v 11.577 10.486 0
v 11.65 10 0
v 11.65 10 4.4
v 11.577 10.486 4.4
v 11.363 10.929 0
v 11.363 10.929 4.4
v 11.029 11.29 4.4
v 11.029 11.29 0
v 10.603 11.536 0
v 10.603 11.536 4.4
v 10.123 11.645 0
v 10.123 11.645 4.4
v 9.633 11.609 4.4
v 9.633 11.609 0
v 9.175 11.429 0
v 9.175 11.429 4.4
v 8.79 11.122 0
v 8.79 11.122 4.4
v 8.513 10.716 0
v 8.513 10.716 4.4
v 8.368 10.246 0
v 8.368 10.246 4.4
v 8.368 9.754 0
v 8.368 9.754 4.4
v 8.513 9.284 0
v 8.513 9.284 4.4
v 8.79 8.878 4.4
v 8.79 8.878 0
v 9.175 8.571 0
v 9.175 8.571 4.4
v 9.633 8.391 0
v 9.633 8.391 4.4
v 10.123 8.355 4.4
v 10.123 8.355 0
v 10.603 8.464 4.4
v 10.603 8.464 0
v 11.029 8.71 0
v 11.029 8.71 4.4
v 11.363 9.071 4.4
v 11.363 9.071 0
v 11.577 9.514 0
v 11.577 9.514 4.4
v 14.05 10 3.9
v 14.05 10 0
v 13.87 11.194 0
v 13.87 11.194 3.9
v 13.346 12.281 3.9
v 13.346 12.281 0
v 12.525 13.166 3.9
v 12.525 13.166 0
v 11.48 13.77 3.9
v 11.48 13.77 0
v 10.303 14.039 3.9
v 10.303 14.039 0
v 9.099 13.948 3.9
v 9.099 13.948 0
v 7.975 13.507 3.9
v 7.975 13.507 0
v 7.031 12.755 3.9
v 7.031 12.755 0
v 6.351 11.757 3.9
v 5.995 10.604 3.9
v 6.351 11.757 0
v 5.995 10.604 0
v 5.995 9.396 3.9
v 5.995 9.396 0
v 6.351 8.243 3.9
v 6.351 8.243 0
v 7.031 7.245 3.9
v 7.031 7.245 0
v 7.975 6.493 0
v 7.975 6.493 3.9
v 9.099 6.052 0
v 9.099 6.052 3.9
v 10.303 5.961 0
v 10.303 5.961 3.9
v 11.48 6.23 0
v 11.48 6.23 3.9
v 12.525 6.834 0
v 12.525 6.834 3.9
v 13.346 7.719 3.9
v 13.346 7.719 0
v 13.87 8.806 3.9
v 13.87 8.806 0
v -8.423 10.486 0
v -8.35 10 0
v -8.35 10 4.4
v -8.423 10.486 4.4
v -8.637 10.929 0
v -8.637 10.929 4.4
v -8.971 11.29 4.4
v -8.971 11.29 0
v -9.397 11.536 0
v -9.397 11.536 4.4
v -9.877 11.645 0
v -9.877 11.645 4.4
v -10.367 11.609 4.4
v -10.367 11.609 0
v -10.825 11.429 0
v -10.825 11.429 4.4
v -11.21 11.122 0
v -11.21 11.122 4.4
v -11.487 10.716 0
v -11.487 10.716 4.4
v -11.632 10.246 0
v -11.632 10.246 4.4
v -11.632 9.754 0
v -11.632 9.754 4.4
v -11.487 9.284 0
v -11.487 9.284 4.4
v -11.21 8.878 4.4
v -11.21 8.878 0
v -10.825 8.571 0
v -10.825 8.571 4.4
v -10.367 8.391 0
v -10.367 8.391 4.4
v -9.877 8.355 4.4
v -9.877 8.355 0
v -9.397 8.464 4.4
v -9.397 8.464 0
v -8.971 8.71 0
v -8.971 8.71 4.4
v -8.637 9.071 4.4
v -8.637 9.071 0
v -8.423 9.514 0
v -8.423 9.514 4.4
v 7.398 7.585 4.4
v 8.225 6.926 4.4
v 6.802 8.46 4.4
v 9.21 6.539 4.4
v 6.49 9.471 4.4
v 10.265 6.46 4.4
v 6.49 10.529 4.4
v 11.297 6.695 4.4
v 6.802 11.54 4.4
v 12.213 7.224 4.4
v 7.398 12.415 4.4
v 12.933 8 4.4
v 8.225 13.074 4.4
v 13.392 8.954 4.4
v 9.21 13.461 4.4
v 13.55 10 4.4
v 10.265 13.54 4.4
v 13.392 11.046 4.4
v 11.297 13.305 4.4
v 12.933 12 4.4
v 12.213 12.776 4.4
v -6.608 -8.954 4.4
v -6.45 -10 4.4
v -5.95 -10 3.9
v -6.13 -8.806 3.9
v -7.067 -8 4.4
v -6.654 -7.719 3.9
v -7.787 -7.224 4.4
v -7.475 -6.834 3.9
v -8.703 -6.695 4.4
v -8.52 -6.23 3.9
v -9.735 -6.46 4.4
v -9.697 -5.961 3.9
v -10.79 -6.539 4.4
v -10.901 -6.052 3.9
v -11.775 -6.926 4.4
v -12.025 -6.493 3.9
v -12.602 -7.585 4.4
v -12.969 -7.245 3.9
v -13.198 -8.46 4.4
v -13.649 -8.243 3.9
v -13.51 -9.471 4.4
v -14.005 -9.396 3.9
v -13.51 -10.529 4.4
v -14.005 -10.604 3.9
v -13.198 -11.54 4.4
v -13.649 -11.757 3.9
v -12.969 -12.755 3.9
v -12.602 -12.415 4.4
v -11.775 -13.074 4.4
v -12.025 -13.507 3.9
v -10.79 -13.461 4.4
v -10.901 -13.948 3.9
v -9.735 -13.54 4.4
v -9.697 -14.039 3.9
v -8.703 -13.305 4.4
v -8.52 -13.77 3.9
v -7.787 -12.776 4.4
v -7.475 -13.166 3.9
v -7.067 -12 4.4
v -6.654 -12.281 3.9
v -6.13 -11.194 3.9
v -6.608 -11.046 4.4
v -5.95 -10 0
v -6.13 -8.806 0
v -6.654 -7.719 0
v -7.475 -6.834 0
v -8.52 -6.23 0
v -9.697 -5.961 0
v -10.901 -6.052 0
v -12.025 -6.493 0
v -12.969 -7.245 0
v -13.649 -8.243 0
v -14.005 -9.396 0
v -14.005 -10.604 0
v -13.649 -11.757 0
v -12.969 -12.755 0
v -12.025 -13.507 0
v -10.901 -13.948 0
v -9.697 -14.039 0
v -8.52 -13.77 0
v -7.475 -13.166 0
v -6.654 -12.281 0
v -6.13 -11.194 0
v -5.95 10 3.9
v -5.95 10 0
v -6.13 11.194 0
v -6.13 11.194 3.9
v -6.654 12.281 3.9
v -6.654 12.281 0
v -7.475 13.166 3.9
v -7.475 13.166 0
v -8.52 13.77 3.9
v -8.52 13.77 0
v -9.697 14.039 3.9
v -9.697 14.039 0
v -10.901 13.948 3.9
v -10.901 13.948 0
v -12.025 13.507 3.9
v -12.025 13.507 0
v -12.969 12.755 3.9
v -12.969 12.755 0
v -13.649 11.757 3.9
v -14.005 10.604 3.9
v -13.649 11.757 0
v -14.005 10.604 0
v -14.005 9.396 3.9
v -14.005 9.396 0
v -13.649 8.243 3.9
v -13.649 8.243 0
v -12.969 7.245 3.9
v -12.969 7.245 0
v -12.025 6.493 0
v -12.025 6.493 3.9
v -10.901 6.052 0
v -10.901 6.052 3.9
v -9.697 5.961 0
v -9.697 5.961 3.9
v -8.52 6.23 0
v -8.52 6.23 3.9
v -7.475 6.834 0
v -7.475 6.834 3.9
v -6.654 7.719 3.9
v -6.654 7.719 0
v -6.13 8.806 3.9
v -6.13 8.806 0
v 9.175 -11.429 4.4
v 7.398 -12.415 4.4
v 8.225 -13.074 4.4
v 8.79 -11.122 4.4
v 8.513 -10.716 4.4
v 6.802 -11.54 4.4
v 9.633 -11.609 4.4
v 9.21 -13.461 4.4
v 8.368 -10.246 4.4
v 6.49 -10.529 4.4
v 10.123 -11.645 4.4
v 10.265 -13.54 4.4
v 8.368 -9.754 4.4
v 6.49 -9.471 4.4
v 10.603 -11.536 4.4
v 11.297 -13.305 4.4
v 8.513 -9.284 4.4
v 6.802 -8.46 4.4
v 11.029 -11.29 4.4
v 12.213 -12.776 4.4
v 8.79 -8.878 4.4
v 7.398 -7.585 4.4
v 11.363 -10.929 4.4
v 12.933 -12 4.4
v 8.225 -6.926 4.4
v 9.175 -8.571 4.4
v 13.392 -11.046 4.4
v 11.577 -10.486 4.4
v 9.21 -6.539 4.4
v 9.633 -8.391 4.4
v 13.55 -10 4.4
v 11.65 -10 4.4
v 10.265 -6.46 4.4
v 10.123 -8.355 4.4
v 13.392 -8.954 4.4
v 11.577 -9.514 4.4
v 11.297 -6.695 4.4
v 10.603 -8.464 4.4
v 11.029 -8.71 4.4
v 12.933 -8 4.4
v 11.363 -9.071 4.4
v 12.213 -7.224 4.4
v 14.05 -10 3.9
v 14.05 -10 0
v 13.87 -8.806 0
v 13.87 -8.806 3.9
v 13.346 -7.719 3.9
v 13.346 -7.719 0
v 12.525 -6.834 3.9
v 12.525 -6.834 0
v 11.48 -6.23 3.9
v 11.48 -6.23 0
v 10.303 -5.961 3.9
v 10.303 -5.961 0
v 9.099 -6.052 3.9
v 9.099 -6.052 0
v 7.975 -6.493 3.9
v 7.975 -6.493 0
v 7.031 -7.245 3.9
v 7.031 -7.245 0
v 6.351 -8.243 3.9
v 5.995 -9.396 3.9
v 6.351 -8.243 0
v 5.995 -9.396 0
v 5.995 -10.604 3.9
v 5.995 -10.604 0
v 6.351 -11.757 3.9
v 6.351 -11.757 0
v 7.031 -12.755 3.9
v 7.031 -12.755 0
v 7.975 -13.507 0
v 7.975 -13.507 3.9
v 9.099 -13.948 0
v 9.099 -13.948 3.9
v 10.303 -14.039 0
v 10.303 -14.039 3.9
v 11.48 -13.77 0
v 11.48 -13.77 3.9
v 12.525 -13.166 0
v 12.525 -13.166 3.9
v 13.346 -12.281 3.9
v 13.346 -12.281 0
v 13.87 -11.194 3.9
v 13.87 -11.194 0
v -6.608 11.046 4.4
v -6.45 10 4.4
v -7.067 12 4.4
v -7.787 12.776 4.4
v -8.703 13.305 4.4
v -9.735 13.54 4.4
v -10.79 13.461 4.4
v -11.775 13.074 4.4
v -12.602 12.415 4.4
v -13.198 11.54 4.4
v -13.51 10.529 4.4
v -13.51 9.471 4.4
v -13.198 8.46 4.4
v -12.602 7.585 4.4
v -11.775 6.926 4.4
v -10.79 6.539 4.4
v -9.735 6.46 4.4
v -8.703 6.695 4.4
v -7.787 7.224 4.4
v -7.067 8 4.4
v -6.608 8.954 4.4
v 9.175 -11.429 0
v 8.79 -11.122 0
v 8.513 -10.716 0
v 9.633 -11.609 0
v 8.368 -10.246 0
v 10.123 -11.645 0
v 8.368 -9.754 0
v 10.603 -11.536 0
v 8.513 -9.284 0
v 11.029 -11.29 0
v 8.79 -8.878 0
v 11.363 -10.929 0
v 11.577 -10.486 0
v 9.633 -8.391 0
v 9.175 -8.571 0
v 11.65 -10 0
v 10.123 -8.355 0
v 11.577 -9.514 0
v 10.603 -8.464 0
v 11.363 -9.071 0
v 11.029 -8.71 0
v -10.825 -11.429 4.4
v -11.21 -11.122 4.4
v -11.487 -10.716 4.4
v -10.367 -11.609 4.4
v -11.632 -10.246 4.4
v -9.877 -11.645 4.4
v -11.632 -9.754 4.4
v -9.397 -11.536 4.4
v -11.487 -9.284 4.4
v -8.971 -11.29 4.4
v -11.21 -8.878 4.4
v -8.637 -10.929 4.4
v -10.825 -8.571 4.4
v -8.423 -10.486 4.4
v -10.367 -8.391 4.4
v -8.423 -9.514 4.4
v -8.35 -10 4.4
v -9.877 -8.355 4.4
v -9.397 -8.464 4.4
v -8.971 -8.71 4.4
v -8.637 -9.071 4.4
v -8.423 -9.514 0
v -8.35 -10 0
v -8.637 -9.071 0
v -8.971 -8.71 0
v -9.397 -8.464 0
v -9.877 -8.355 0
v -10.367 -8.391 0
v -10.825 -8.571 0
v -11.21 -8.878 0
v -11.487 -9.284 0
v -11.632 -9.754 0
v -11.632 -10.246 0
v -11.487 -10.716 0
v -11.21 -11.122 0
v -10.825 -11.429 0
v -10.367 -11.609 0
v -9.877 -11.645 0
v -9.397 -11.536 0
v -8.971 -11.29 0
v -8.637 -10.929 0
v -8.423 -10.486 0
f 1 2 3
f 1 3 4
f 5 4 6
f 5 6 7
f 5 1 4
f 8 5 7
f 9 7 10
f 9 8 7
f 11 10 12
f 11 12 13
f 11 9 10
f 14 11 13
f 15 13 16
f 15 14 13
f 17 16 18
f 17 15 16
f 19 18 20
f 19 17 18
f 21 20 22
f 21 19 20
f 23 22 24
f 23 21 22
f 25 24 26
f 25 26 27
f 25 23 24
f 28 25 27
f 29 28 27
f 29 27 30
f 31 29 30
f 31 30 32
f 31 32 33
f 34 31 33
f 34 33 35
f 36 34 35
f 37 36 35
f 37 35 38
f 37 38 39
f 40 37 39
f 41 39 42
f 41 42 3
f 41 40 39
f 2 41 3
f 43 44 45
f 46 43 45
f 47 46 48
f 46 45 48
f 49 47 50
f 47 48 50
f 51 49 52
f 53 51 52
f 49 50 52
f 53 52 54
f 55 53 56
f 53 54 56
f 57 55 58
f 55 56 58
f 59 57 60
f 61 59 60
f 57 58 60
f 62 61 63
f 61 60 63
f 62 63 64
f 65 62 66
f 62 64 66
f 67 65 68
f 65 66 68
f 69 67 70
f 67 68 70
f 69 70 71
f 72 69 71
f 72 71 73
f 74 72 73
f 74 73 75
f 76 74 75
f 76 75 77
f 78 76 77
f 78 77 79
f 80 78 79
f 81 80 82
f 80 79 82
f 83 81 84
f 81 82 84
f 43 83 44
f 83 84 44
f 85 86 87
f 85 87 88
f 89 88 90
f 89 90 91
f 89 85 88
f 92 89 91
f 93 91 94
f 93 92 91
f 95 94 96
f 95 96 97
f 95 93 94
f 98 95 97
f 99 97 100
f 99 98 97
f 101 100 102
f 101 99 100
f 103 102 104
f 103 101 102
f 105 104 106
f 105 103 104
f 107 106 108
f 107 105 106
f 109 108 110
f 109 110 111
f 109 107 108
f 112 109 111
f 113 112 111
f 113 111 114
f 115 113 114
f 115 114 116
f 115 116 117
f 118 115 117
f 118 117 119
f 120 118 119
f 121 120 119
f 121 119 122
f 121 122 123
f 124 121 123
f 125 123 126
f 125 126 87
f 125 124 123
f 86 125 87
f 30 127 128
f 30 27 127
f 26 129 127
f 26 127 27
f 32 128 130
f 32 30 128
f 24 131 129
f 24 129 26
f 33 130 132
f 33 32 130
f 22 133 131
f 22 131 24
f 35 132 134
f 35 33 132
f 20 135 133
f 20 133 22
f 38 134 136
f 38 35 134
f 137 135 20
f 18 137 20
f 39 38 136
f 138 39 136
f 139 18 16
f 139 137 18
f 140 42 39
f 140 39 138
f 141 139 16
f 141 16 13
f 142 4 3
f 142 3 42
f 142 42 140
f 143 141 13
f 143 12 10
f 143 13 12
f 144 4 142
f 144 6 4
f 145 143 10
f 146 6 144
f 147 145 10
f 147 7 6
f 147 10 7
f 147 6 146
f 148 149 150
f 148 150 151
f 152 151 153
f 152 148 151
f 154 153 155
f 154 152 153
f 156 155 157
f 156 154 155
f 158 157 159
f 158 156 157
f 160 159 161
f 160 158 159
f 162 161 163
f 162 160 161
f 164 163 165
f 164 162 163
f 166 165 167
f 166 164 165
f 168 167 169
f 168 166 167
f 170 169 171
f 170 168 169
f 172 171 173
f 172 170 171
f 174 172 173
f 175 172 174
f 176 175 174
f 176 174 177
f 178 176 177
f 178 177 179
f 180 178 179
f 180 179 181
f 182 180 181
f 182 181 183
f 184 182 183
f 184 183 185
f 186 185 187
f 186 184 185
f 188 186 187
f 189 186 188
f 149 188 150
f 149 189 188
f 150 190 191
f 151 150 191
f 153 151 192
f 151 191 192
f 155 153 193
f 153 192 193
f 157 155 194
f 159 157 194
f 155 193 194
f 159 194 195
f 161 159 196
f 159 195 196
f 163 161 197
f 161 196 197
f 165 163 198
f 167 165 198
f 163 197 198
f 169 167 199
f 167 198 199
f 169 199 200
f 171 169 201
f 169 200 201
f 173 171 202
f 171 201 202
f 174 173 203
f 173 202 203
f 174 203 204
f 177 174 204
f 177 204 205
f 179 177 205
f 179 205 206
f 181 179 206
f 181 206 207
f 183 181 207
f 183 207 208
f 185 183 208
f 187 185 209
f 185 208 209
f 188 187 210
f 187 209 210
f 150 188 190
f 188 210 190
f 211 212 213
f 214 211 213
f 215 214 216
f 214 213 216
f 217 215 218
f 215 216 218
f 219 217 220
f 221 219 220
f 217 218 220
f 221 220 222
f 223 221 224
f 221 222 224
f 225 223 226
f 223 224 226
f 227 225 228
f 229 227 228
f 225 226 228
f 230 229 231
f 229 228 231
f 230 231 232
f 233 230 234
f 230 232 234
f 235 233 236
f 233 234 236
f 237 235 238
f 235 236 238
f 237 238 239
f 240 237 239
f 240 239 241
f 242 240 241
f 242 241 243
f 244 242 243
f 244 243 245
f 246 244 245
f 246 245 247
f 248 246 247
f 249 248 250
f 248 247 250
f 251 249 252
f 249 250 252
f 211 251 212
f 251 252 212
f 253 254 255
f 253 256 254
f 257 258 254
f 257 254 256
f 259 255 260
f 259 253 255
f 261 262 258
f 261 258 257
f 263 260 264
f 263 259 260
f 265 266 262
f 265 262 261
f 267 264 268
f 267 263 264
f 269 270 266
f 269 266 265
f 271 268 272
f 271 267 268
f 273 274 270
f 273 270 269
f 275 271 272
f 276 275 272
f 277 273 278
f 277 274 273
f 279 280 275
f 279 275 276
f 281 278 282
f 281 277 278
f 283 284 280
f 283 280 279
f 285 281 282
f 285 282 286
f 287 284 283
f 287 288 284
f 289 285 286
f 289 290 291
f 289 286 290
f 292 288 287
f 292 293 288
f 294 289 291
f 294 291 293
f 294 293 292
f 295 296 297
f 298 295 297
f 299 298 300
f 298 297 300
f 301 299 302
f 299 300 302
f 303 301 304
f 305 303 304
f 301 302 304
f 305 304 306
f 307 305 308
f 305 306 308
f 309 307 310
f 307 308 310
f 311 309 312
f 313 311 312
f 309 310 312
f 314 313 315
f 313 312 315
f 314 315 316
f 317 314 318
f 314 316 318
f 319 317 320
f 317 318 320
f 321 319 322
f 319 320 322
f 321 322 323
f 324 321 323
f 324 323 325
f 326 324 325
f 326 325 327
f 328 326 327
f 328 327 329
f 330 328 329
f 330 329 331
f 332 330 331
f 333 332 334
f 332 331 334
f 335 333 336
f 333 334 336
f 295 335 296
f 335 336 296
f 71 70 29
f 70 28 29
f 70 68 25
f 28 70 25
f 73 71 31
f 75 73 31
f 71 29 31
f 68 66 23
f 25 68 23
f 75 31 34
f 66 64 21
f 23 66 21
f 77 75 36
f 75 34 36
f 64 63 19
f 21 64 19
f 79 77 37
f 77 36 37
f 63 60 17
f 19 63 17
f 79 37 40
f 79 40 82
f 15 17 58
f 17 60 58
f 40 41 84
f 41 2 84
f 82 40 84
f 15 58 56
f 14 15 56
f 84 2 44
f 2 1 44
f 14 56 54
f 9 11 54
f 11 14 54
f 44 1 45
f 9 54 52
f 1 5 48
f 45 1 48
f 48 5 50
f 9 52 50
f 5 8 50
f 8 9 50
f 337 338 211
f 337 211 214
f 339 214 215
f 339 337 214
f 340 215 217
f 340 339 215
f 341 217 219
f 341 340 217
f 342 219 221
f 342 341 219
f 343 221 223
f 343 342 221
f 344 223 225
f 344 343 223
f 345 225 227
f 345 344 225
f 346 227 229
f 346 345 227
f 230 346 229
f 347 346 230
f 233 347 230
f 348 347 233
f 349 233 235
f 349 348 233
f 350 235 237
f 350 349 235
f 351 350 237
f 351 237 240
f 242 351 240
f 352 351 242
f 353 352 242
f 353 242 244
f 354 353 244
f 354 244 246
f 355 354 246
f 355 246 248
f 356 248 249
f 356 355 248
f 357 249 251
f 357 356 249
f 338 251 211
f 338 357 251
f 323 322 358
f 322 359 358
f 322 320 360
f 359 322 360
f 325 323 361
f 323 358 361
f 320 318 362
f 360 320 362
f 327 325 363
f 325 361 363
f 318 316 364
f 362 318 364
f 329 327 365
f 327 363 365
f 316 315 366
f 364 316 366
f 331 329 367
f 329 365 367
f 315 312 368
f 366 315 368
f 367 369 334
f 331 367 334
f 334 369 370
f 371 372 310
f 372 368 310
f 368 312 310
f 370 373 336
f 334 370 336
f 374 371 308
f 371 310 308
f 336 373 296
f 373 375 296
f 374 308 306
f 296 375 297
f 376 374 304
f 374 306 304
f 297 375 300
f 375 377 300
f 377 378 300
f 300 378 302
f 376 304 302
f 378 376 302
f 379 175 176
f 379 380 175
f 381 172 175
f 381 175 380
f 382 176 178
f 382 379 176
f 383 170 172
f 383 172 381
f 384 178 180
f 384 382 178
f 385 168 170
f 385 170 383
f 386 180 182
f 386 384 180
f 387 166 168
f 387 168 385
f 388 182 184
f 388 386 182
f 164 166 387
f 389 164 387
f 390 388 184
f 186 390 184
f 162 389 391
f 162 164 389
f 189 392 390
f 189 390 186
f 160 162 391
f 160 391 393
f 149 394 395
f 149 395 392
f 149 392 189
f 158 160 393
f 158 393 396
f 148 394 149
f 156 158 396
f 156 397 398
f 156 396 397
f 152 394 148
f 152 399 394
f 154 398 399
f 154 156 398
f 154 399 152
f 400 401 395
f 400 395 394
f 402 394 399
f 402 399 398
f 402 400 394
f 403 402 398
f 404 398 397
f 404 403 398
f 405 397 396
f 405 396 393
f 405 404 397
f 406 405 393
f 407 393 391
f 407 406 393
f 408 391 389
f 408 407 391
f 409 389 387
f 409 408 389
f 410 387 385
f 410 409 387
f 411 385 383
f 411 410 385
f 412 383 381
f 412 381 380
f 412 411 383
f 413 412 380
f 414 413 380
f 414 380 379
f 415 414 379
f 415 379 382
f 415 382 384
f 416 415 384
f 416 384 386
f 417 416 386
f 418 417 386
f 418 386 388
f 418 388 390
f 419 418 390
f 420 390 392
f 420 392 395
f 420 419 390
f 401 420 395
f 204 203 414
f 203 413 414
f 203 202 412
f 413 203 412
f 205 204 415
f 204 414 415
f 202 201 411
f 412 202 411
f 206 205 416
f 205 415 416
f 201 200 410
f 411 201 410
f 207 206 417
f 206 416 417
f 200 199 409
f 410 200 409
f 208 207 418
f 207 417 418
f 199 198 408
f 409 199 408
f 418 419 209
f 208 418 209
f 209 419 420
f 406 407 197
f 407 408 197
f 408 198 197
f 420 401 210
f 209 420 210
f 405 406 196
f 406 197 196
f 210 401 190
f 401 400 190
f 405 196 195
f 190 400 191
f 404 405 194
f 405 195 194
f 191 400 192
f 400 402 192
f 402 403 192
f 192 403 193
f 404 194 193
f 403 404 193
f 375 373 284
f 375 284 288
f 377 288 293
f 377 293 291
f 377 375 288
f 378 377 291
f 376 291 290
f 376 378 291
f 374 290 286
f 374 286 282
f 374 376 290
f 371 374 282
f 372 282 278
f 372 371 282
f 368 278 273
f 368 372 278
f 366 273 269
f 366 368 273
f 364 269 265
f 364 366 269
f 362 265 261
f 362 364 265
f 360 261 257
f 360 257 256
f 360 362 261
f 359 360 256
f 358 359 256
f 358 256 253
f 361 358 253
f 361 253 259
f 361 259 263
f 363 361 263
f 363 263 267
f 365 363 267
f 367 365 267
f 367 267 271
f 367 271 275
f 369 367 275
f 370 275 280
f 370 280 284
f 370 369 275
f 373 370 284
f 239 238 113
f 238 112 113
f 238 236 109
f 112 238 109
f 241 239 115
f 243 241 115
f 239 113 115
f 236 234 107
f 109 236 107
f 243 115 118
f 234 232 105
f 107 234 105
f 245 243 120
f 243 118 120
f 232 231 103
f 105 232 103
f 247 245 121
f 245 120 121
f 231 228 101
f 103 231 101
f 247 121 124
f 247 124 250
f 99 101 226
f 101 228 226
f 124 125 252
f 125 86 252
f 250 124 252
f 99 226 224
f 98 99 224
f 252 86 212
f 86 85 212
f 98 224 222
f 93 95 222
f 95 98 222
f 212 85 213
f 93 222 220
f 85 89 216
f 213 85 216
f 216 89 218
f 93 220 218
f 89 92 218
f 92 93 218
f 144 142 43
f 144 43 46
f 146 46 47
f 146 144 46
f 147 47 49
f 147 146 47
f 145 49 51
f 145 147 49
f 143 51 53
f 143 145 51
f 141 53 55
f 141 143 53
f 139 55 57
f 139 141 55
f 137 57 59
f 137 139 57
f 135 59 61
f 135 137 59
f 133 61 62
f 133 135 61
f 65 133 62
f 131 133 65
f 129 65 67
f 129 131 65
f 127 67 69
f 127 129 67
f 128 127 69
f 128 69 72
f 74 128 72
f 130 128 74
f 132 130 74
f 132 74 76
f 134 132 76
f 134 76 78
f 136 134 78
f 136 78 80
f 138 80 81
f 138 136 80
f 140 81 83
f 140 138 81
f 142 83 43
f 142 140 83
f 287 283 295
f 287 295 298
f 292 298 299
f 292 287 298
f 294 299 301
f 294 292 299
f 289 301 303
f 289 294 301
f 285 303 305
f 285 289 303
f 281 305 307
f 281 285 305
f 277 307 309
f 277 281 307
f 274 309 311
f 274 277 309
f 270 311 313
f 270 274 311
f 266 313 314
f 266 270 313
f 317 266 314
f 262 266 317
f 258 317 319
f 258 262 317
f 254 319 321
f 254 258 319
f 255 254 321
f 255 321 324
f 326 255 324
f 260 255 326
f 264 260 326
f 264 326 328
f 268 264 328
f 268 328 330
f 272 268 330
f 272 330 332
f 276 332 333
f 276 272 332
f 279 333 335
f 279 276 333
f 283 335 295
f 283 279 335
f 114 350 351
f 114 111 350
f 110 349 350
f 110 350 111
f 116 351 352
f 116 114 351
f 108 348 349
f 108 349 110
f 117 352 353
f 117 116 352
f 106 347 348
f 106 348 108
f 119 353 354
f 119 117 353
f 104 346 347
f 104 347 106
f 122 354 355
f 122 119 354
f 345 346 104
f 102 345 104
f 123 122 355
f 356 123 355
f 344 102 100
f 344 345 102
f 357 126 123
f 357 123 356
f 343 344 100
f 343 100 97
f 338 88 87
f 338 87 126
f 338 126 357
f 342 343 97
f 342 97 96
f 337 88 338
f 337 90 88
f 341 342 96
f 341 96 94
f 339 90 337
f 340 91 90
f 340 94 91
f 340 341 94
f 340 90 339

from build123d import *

# Parameters (mm, degrees)
F0_R     = 4.05
F0_R_2   = 1.65
F1_DEPTH = 4.4
F2_SIZE  = 0.5


with BuildPart() as f1:
    # F0 (on Top) → F1 (new body)
    with BuildSketch(Plane.XY):
        with Locations((-10, 10)):
            Circle(F0_R)
        with Locations((-10, 10)):
            Circle(F0_R_2, mode=Mode.SUBTRACT)
        with Locations((10, 10)):
            Circle(F0_R)
        with Locations((10, 10)):
            Circle(F0_R_2, mode=Mode.SUBTRACT)
        with Locations((10, -10)):
            Circle(F0_R)
        with Locations((10, -10)):
            Circle(F0_R_2, mode=Mode.SUBTRACT)
        with Locations((-10, -10)):
            Circle(F0_R)
        with Locations((-10, -10)):
            Circle(F0_R_2, mode=Mode.SUBTRACT)
    extrude(amount=F1_DEPTH)

    # F2
    f2_edges = [f1.edges().sort_by_distance(p)[0] for p in [
        (-14.05, 10, 4.4),
        (5.95, 10, 4.4),
        (5.95, -10, 4.4),
        (-14.05, -10, 4.4),
    ]]
    chamfer(f2_edges, length=F2_SIZE)


solid = f1.part
